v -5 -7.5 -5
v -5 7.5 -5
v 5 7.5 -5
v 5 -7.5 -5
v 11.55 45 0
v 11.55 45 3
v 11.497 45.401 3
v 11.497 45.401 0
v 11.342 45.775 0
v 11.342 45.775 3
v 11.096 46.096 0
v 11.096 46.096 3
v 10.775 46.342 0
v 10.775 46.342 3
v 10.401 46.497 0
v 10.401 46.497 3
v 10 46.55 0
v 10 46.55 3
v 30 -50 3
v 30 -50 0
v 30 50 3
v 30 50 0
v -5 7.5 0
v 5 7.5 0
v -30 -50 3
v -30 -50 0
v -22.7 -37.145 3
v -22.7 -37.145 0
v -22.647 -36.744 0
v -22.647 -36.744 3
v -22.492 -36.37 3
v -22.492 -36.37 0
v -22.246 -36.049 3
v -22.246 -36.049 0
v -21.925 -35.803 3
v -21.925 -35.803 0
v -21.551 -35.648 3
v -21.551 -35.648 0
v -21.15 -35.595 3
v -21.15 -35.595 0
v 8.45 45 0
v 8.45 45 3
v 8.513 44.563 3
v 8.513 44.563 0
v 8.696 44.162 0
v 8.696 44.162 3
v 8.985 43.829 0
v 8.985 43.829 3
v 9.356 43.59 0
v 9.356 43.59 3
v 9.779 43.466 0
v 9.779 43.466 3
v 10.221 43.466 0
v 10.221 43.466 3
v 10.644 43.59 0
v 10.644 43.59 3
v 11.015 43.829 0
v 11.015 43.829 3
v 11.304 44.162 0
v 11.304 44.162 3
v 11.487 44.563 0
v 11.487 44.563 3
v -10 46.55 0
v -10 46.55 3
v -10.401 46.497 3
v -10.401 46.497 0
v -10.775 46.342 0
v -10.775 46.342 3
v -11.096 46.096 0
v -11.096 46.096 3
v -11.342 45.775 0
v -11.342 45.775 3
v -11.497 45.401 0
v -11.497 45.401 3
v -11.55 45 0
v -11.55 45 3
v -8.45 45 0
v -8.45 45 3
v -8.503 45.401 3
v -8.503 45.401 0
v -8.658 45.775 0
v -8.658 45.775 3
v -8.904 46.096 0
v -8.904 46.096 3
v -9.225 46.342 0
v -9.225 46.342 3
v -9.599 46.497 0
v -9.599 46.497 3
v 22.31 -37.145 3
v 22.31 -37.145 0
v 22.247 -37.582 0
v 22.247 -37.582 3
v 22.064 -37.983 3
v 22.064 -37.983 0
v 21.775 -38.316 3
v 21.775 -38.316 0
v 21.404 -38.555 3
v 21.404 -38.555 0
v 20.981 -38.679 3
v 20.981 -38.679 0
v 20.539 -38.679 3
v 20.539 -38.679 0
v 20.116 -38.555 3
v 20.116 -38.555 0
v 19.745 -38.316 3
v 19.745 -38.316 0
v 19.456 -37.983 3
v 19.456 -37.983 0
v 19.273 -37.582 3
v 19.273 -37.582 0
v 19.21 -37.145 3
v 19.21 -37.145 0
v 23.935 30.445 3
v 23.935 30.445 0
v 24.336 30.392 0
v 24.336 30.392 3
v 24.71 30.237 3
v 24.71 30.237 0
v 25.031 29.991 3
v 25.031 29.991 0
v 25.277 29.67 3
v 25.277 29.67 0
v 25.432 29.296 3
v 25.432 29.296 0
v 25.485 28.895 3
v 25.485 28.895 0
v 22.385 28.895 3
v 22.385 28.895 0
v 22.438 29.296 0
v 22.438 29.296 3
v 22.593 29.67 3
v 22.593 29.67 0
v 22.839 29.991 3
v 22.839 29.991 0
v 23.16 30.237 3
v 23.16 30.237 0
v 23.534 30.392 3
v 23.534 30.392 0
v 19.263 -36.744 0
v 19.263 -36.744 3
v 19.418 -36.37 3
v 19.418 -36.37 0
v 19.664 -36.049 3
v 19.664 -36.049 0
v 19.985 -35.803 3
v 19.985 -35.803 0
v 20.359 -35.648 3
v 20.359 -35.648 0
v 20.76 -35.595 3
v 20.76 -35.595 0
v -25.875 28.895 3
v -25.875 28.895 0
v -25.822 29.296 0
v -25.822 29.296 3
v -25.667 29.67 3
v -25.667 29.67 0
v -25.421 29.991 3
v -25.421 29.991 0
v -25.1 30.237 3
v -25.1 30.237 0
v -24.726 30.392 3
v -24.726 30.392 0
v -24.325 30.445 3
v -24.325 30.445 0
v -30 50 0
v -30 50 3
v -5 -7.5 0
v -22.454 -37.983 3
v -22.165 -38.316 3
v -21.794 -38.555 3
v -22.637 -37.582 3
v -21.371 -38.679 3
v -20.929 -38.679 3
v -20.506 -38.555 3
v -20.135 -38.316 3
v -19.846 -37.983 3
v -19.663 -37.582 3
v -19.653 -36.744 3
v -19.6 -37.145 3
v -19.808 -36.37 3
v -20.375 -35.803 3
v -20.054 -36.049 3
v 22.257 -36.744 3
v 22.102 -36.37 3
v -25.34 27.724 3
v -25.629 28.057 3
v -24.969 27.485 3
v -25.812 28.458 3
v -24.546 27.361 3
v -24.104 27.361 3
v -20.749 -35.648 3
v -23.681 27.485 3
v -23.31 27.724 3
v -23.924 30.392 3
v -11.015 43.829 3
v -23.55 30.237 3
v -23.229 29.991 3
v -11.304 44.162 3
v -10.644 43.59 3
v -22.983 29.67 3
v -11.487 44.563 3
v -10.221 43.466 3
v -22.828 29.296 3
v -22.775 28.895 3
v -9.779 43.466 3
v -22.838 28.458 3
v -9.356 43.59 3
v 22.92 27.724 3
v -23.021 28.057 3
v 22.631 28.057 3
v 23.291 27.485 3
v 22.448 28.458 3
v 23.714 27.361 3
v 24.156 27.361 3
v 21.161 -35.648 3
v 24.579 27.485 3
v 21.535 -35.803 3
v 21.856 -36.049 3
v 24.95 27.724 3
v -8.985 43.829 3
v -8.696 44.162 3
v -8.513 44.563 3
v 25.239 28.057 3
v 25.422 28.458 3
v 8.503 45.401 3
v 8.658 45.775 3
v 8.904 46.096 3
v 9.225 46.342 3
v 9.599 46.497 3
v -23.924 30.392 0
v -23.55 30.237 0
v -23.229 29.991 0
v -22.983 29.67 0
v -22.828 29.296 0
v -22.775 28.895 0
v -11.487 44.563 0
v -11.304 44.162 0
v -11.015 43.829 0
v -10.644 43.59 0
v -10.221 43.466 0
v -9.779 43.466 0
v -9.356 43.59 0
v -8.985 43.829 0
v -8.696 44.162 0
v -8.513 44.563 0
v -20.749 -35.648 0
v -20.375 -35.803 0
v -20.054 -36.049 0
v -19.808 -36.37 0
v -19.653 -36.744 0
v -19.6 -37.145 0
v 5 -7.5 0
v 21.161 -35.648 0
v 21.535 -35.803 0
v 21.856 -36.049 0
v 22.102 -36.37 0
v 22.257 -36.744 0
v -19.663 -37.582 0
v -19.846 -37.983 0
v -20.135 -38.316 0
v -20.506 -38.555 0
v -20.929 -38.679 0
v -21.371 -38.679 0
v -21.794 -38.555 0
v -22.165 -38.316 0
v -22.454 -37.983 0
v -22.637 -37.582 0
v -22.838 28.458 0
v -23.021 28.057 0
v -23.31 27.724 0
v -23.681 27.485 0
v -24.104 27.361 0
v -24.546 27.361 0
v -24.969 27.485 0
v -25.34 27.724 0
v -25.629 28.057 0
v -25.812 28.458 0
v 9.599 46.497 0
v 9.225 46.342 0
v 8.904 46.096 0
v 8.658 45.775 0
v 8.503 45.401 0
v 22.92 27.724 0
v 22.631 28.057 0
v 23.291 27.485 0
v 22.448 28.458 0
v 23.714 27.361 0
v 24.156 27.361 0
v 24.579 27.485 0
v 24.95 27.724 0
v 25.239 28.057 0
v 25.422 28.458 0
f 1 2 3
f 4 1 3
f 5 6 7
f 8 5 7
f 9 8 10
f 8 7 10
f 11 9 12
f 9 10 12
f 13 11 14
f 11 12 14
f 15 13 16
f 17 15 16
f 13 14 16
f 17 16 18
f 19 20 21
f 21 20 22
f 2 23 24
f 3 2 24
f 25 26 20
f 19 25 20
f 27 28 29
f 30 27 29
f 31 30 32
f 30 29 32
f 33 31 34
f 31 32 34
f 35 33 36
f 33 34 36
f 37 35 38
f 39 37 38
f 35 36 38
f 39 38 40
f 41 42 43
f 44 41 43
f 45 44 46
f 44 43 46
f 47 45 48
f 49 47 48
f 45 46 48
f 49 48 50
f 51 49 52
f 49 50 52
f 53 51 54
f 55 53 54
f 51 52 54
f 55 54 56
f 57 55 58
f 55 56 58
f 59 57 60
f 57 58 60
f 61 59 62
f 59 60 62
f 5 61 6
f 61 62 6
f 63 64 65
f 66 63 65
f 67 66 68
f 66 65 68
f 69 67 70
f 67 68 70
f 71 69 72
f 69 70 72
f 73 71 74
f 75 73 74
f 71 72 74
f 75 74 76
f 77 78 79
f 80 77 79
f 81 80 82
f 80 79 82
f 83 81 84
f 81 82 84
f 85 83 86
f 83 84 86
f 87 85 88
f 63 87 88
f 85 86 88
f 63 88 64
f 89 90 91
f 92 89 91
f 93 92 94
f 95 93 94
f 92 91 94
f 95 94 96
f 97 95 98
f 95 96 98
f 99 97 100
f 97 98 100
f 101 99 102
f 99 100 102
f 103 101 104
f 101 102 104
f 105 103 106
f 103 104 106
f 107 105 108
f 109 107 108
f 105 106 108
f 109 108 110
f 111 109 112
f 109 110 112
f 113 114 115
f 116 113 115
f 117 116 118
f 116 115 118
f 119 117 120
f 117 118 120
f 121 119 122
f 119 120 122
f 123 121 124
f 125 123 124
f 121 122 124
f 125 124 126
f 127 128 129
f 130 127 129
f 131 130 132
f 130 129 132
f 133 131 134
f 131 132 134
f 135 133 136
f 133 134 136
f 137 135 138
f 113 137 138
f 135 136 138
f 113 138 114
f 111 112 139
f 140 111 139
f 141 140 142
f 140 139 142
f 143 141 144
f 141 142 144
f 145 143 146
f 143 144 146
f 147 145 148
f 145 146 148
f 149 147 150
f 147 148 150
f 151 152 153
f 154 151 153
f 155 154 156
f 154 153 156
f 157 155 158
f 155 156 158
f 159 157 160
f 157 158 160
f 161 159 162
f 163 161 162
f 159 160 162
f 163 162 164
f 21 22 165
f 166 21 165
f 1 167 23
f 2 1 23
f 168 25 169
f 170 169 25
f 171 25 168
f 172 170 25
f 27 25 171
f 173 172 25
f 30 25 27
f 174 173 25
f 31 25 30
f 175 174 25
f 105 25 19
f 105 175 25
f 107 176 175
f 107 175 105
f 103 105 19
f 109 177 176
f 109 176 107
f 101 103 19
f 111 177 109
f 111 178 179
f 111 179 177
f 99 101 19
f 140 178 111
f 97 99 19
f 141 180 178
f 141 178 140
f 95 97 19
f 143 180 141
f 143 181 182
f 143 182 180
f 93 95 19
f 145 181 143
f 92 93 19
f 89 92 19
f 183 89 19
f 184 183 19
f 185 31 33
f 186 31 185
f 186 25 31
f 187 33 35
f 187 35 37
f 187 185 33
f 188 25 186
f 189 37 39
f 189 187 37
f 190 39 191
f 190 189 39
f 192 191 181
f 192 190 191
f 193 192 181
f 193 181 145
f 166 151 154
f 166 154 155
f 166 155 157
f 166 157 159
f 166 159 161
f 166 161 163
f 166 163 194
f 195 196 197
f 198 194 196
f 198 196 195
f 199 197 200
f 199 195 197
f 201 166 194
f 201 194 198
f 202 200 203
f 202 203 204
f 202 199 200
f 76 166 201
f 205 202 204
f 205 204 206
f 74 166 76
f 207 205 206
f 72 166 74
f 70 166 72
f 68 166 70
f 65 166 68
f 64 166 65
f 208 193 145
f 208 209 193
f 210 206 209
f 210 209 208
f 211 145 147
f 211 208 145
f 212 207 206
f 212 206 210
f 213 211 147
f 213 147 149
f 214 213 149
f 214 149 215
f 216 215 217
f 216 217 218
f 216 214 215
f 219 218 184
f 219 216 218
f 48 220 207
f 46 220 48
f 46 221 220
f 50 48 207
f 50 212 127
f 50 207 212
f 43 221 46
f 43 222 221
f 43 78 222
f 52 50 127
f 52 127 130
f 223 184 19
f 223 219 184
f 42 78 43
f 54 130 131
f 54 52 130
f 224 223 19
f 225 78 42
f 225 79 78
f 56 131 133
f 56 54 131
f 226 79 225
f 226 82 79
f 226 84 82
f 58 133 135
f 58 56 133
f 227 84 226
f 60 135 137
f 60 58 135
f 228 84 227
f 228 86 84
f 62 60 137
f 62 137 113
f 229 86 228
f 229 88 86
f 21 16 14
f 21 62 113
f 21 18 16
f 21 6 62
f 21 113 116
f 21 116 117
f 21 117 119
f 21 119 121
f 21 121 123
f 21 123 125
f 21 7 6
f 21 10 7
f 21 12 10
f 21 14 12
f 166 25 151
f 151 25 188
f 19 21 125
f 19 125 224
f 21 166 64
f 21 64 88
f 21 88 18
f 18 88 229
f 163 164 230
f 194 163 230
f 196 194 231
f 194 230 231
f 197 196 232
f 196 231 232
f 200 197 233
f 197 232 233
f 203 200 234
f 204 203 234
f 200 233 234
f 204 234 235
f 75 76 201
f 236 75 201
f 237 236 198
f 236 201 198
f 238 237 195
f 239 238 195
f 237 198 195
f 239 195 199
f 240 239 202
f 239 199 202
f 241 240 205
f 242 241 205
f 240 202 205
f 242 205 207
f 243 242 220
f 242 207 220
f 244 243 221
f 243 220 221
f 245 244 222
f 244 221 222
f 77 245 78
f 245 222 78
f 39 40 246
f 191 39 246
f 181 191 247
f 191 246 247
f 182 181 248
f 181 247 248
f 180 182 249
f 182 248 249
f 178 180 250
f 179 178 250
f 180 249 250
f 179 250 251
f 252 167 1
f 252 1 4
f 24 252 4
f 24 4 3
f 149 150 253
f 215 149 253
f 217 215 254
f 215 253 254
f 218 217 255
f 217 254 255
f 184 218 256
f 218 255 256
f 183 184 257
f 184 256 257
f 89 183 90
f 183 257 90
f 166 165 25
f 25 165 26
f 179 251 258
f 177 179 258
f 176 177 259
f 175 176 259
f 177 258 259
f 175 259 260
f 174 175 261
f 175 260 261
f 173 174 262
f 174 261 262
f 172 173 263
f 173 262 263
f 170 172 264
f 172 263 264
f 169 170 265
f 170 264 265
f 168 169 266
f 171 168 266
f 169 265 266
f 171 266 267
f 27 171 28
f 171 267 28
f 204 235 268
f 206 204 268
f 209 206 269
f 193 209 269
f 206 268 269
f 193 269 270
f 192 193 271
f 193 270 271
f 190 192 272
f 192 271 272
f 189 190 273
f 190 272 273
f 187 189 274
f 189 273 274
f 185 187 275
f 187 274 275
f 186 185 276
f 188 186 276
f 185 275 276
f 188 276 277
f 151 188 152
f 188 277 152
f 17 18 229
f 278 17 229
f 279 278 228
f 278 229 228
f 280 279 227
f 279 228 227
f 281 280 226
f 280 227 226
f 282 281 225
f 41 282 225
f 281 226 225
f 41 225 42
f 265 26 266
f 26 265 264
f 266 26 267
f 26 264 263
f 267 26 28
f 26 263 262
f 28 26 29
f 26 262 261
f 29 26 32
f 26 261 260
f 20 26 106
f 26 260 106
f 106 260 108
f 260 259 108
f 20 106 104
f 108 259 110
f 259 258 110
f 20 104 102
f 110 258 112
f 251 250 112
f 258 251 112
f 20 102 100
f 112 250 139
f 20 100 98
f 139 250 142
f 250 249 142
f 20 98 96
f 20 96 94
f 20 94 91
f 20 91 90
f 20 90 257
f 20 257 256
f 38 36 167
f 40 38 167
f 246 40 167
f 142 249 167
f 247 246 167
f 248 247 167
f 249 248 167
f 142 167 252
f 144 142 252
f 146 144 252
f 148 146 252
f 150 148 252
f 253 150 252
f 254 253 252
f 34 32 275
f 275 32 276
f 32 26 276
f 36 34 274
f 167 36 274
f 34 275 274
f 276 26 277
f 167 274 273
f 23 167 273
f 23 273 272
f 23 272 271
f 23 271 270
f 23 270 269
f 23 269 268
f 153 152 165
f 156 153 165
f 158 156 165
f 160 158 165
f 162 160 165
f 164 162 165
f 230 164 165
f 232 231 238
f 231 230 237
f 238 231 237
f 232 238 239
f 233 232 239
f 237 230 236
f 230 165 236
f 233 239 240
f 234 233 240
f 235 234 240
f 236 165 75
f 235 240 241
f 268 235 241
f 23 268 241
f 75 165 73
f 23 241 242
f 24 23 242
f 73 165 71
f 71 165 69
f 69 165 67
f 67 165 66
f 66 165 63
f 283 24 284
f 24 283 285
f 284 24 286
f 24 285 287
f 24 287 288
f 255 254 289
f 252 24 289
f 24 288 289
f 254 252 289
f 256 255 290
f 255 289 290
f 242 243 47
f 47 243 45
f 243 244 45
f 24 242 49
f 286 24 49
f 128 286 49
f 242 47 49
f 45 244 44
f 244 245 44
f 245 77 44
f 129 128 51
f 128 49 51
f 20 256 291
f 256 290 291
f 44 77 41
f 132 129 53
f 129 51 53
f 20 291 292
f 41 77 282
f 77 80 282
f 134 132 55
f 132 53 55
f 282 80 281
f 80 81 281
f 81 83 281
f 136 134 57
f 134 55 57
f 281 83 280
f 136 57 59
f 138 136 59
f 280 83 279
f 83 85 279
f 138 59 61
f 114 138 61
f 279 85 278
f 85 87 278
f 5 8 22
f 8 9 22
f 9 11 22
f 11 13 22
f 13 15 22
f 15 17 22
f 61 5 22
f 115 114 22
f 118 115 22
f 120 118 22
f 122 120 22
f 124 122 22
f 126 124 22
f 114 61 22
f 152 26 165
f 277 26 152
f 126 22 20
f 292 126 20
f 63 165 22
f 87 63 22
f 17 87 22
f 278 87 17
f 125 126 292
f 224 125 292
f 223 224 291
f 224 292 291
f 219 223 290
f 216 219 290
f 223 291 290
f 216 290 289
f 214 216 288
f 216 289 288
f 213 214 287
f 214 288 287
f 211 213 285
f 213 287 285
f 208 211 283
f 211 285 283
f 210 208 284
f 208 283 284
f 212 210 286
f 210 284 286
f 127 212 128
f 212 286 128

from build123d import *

# Parameters (mm, degrees)
F0_W     = 10
F0_H     = 15
F1_DEPTH = 5
F2_DEPTH = 3
F4_DEPTH = 3
F5_DEPTH = 25


with BuildPart() as f1:
    # F0 (on Top) → F1 (new body)
    with BuildSketch(Plane.XY):
        Rectangle(F0_W, F0_H)
    extrude(amount=-F1_DEPTH)

    # F0 (on Top) → F2 (join)
    with BuildSketch(Plane.XY):
        with BuildLine():
            Line((-30, -50), (30, -50))
            Line((30, -50), (30, 50))
            Line((30, 50), (15, 50))
            Line((15, 50), (15, 46.55))
            ThreePointArc((15, 46.55), (16.0960155108, 46.0960155108), (16.55, 45))
            ThreePointArc((16.55, 45), (16.2263348543, 44.0520533638), (15.3905124838, 43.5))
            Line((15.3905124838, 43.5), (20.76, 43.5))
            Line((20.76, 43.5), (23.935, 43.5))
            Line((23.935, 43.5), (27.5, 43.5))
            Line((27.5, 43.5), (27.5, -43.5))
            Line((27.5, -43.5), (-27.5, -43.5))
            Line((-27.5, -43.5), (-27.5, -37.145))
            Line((-27.5, -37.145), (-27.5, 28.895))
            Line((-27.5, 28.895), (-27.5, 43.5))
            Line((-27.5, 43.5), (-24.325, 43.5))
            Line((-24.325, 43.5), (-21.15, 43.5))
            Line((-21.15, 43.5), (-15.3905124838, 43.5))
            ThreePointArc((-15.3905124838, 43.5), (-16.2263348543, 44.0520533638), (-16.55, 45))
            Line((-16.55, 45), (-30, 45))
            Line((-30, 45), (-30, -50))
        make_face()
        with BuildLine():
            Line((-30, 50), (-30, 45))
            Line((-30, 45), (-16.55, 45))
            ThreePointArc((-16.55, 45), (-16.0960155108, 46.0960155108), (-15, 46.55))
            Line((-15, 46.55), (-15, 50))
            Line((-15, 50), (-30, 50))
        make_face()
        with BuildLine():
            Line((15, 46.55), (15, 50))
            Line((15, 50), (-15, 50))
            Line((-15, 50), (-15, 46.55))
            ThreePointArc((-15, 46.55), (-13.9039844892, 46.0960155108), (-13.45, 45))
            Line((-13.45, 45), (13.45, 45))
            ThreePointArc((13.45, 45), (13.9039844892, 46.0960155108), (15, 46.55))
        make_face()
        with BuildLine():
            ThreePointArc((-14.6094875162, 43.5), (-15, 43.45), (-15.3905124838, 43.5))
            Line((-15.3905124838, 43.5), (-21.15, 43.5))
            Line((-21.15, 43.5), (-21.15, 28.895))
            Line((-21.15, 28.895), (20.76, 28.895))
            Line((20.76, 28.895), (20.76, 43.5))
            Line((20.76, 43.5), (15.3905124838, 43.5))
            ThreePointArc((15.3905124838, 43.5), (15, 43.45), (14.6094875162, 43.5))
            Line((14.6094875162, 43.5), (-14.6094875162, 43.5))
        make_face()
        with BuildLine():
            ThreePointArc((14.6094875162, 43.5), (13.7736651457, 44.0520533638), (13.45, 45))
            Line((13.45, 45), (-13.45, 45))
            ThreePointArc((-13.45, 45), (-13.7736651457, 44.0520533638), (-14.6094875162, 43.5))
            Line((-14.6094875162, 43.5), (14.6094875162, 43.5))
        make_face()
        with BuildLine():
            Line((-21.15, 28.895), (-21.15, 43.5))
            Line((-21.15, 43.5), (-24.325, 43.5))
            Line((-24.325, 43.5), (-24.325, 30.445))
            ThreePointArc((-24.325, 30.445), (-23.2289844892, 29.9910155108), (-22.775, 28.895))
            Line((-22.775, 28.895), (-21.15, 28.895))
        make_face()
        with BuildLine():
            Line((-24.325, 30.445), (-24.325, 43.5))
            Line((-24.325, 43.5), (-27.5, 43.5))
            Line((-27.5, 43.5), (-27.5, 28.895))
            Line((-27.5, 28.895), (-25.875, 28.895))
            ThreePointArc((-25.875, 28.895), (-25.4210155108, 29.9910155108), (-24.325, 30.445))
        make_face()
        with BuildLine():
            Line((-21.15, -35.595), (-21.15, 28.895))
            Line((-21.15, 28.895), (-22.775, 28.895))
            ThreePointArc((-22.775, 28.895), (-24.325, 27.345), (-25.875, 28.895))
            Line((-25.875, 28.895), (-27.5, 28.895))
            Line((-27.5, 28.895), (-27.5, -37.145))
            Line((-27.5, -37.145), (-22.7, -37.145))
            ThreePointArc((-22.7, -37.145), (-22.2460155108, -36.0489844892), (-21.15, -35.595))
        make_face()
        with BuildLine():
            Line((20.76, 28.895), (-21.15, 28.895))
            Line((-21.15, 28.895), (-21.15, -35.595))
            ThreePointArc((-21.15, -35.595), (-20.0539844892, -36.0489844892), (-19.6, -37.145))
            Line((-19.6, -37.145), (19.21, -37.145))
            ThreePointArc((19.21, -37.145), (19.6639844892, -36.0489844892), (20.76, -35.595))
            Line((20.76, -35.595), (20.76, 28.895))
        make_face()
        Rectangle(F0_W, F0_H, mode=Mode.SUBTRACT)
        with BuildLine():
            Line((23.935, 43.5), (20.76, 43.5))
            Line((20.76, 43.5), (20.76, 28.895))
            Line((20.76, 28.895), (22.385, 28.895))
            ThreePointArc((22.385, 28.895), (22.8389844892, 29.9910155108), (23.935, 30.445))
            Line((23.935, 30.445), (23.935, 43.5))
        make_face()
        with BuildLine():
            Line((22.385, 28.895), (20.76, 28.895))
            Line((20.76, 28.895), (20.76, -35.595))
            ThreePointArc((20.76, -35.595), (21.8560155108, -36.0489844892), (22.31, -37.145))
            ThreePointArc((22.31, -37.145), (20.76, -38.695), (19.21, -37.145))
            Line((19.21, -37.145), (-19.6, -37.145))
            ThreePointArc((-19.6, -37.145), (-21.15, -38.695), (-22.7, -37.145))
            Line((-22.7, -37.145), (-27.5, -37.145))
            Line((-27.5, -37.145), (-27.5, -43.5))
            Line((-27.5, -43.5), (27.5, -43.5))
            Line((27.5, -43.5), (27.5, 43.5))
            Line((27.5, 43.5), (23.935, 43.5))
            Line((23.935, 43.5), (23.935, 30.445))
            ThreePointArc((23.935, 30.445), (25.0310155108, 29.9910155108), (25.485, 28.895))
            ThreePointArc((25.485, 28.895), (23.935, 27.345), (22.385, 28.895))
        make_face()
        Rectangle(F0_W, F0_H)
    extrude(amount=F2_DEPTH)

    # F3 (on face) → F4 (join)
    with BuildSketch(Plane.XY.offset(3)):
        with BuildLine():
            Line((10, 50), (-10, 50))
            Line((-10, 50), (-10, 46.55))
            ThreePointArc((-10, 46.55), (-8.9039844892, 46.0960155108), (-8.45, 45))
            Line((-8.45, 45), (8.45, 45))
            ThreePointArc((8.45, 45), (8.9039844892, 46.0960155108), (10, 46.55))
            Line((10, 46.55), (10, 50))
        make_face()
        with BuildLine():
            Line((30, 50), (10, 50))
            Line((10, 50), (10, 46.55))
            ThreePointArc((10, 46.55), (11.0960155108, 46.0960155108), (11.55, 45))
            Line((11.55, 45), (13.45, 45))
            ThreePointArc((13.45, 45), (15, 46.55), (16.55, 45))
            Line((16.55, 45), (30, 45))
            Line((30, 45), (30, 50))
        make_face()
        with BuildLine():
            Line((-16.55, 45), (-30, 45))
            Line((-30, 45), (-30, 40))
            Line((-30, 40), (30, 40))
            Line((30, 40), (30, 45))
            Line((30, 45), (16.55, 45))
            ThreePointArc((16.55, 45), (15, 43.45), (13.45, 45))
            Line((13.45, 45), (11.55, 45))
            ThreePointArc((11.55, 45), (10, 43.45), (8.45, 45))
            Line((8.45, 45), (-8.45, 45))
            ThreePointArc((-8.45, 45), (-10, 43.45), (-11.55, 45))
            Line((-11.55, 45), (-13.45, 45))
            ThreePointArc((-13.45, 45), (-15, 43.45), (-16.55, 45))
        make_face()
        with BuildLine():
            Line((-13.45, 45), (-16.55, 45))
            ThreePointArc((-16.55, 45), (-15, 43.45), (-13.45, 45))
        make_face()
        with BuildLine():
            ThreePointArc((-13.45, 45), (-15, 46.55), (-16.55, 45))
            Line((-16.55, 45), (-13.45, 45))
        make_face()
        with BuildLine():
            Line((-10, 50), (-30, 50))
            Line((-30, 50), (-30, 45))
            Line((-30, 45), (-16.55, 45))
            ThreePointArc((-16.55, 45), (-15, 46.55), (-13.45, 45))
            Line((-13.45, 45), (-11.55, 45))
            ThreePointArc((-11.55, 45), (-11.0960155108, 46.0960155108), (-10, 46.55))
            Line((-10, 46.55), (-10, 50))
        make_face()
        with BuildLine():
            Line((13.45, 45), (16.55, 45))
            ThreePointArc((16.55, 45), (15, 46.55), (13.45, 45))
        make_face()
        with BuildLine():
            ThreePointArc((13.45, 45), (15, 43.45), (16.55, 45))
            Line((16.55, 45), (13.45, 45))
        make_face()
    extrude(amount=-F4_DEPTH)

    # F3 (on face) → F5 (cut)
    with BuildSketch(Plane.XY.offset(3)):
        with BuildLine():
            Line((-8.45, 45), (-10, 45))
            Line((-10, 45), (-11.55, 45))
            ThreePointArc((-11.55, 45), (-10, 43.45), (-8.45, 45))
        make_face()
        with BuildLine():
            ThreePointArc((-8.45, 45), (-8.9039844892, 46.0960155108), (-10, 46.55))
            Line((-10, 46.55), (-10, 45))
            Line((-10, 45), (-8.45, 45))
        make_face()
        with BuildLine():
            Line((-10, 45), (-10, 46.55))
            ThreePointArc((-10, 46.55), (-11.0960155108, 46.0960155108), (-11.55, 45))
            Line((-11.55, 45), (-10, 45))
        make_face()
        with BuildLine():
            ThreePointArc((11.55, 45), (11.0960155108, 46.0960155108), (10, 46.55))
            Line((10, 46.55), (10, 45))
            Line((10, 45), (11.55, 45))
        make_face()
        with BuildLine():
            Line((10, 45), (10, 46.55))
            ThreePointArc((10, 46.55), (8.9039844892, 46.0960155108), (8.45, 45))
            Line((8.45, 45), (10, 45))
        make_face()
        with BuildLine():
            Line((11.55, 45), (10, 45))
            Line((10, 45), (8.45, 45))
            ThreePointArc((8.45, 45), (10, 43.45), (11.55, 45))
        make_face()
    extrude(amount=-F5_DEPTH, mode=Mode.SUBTRACT)


solid = f1.part
